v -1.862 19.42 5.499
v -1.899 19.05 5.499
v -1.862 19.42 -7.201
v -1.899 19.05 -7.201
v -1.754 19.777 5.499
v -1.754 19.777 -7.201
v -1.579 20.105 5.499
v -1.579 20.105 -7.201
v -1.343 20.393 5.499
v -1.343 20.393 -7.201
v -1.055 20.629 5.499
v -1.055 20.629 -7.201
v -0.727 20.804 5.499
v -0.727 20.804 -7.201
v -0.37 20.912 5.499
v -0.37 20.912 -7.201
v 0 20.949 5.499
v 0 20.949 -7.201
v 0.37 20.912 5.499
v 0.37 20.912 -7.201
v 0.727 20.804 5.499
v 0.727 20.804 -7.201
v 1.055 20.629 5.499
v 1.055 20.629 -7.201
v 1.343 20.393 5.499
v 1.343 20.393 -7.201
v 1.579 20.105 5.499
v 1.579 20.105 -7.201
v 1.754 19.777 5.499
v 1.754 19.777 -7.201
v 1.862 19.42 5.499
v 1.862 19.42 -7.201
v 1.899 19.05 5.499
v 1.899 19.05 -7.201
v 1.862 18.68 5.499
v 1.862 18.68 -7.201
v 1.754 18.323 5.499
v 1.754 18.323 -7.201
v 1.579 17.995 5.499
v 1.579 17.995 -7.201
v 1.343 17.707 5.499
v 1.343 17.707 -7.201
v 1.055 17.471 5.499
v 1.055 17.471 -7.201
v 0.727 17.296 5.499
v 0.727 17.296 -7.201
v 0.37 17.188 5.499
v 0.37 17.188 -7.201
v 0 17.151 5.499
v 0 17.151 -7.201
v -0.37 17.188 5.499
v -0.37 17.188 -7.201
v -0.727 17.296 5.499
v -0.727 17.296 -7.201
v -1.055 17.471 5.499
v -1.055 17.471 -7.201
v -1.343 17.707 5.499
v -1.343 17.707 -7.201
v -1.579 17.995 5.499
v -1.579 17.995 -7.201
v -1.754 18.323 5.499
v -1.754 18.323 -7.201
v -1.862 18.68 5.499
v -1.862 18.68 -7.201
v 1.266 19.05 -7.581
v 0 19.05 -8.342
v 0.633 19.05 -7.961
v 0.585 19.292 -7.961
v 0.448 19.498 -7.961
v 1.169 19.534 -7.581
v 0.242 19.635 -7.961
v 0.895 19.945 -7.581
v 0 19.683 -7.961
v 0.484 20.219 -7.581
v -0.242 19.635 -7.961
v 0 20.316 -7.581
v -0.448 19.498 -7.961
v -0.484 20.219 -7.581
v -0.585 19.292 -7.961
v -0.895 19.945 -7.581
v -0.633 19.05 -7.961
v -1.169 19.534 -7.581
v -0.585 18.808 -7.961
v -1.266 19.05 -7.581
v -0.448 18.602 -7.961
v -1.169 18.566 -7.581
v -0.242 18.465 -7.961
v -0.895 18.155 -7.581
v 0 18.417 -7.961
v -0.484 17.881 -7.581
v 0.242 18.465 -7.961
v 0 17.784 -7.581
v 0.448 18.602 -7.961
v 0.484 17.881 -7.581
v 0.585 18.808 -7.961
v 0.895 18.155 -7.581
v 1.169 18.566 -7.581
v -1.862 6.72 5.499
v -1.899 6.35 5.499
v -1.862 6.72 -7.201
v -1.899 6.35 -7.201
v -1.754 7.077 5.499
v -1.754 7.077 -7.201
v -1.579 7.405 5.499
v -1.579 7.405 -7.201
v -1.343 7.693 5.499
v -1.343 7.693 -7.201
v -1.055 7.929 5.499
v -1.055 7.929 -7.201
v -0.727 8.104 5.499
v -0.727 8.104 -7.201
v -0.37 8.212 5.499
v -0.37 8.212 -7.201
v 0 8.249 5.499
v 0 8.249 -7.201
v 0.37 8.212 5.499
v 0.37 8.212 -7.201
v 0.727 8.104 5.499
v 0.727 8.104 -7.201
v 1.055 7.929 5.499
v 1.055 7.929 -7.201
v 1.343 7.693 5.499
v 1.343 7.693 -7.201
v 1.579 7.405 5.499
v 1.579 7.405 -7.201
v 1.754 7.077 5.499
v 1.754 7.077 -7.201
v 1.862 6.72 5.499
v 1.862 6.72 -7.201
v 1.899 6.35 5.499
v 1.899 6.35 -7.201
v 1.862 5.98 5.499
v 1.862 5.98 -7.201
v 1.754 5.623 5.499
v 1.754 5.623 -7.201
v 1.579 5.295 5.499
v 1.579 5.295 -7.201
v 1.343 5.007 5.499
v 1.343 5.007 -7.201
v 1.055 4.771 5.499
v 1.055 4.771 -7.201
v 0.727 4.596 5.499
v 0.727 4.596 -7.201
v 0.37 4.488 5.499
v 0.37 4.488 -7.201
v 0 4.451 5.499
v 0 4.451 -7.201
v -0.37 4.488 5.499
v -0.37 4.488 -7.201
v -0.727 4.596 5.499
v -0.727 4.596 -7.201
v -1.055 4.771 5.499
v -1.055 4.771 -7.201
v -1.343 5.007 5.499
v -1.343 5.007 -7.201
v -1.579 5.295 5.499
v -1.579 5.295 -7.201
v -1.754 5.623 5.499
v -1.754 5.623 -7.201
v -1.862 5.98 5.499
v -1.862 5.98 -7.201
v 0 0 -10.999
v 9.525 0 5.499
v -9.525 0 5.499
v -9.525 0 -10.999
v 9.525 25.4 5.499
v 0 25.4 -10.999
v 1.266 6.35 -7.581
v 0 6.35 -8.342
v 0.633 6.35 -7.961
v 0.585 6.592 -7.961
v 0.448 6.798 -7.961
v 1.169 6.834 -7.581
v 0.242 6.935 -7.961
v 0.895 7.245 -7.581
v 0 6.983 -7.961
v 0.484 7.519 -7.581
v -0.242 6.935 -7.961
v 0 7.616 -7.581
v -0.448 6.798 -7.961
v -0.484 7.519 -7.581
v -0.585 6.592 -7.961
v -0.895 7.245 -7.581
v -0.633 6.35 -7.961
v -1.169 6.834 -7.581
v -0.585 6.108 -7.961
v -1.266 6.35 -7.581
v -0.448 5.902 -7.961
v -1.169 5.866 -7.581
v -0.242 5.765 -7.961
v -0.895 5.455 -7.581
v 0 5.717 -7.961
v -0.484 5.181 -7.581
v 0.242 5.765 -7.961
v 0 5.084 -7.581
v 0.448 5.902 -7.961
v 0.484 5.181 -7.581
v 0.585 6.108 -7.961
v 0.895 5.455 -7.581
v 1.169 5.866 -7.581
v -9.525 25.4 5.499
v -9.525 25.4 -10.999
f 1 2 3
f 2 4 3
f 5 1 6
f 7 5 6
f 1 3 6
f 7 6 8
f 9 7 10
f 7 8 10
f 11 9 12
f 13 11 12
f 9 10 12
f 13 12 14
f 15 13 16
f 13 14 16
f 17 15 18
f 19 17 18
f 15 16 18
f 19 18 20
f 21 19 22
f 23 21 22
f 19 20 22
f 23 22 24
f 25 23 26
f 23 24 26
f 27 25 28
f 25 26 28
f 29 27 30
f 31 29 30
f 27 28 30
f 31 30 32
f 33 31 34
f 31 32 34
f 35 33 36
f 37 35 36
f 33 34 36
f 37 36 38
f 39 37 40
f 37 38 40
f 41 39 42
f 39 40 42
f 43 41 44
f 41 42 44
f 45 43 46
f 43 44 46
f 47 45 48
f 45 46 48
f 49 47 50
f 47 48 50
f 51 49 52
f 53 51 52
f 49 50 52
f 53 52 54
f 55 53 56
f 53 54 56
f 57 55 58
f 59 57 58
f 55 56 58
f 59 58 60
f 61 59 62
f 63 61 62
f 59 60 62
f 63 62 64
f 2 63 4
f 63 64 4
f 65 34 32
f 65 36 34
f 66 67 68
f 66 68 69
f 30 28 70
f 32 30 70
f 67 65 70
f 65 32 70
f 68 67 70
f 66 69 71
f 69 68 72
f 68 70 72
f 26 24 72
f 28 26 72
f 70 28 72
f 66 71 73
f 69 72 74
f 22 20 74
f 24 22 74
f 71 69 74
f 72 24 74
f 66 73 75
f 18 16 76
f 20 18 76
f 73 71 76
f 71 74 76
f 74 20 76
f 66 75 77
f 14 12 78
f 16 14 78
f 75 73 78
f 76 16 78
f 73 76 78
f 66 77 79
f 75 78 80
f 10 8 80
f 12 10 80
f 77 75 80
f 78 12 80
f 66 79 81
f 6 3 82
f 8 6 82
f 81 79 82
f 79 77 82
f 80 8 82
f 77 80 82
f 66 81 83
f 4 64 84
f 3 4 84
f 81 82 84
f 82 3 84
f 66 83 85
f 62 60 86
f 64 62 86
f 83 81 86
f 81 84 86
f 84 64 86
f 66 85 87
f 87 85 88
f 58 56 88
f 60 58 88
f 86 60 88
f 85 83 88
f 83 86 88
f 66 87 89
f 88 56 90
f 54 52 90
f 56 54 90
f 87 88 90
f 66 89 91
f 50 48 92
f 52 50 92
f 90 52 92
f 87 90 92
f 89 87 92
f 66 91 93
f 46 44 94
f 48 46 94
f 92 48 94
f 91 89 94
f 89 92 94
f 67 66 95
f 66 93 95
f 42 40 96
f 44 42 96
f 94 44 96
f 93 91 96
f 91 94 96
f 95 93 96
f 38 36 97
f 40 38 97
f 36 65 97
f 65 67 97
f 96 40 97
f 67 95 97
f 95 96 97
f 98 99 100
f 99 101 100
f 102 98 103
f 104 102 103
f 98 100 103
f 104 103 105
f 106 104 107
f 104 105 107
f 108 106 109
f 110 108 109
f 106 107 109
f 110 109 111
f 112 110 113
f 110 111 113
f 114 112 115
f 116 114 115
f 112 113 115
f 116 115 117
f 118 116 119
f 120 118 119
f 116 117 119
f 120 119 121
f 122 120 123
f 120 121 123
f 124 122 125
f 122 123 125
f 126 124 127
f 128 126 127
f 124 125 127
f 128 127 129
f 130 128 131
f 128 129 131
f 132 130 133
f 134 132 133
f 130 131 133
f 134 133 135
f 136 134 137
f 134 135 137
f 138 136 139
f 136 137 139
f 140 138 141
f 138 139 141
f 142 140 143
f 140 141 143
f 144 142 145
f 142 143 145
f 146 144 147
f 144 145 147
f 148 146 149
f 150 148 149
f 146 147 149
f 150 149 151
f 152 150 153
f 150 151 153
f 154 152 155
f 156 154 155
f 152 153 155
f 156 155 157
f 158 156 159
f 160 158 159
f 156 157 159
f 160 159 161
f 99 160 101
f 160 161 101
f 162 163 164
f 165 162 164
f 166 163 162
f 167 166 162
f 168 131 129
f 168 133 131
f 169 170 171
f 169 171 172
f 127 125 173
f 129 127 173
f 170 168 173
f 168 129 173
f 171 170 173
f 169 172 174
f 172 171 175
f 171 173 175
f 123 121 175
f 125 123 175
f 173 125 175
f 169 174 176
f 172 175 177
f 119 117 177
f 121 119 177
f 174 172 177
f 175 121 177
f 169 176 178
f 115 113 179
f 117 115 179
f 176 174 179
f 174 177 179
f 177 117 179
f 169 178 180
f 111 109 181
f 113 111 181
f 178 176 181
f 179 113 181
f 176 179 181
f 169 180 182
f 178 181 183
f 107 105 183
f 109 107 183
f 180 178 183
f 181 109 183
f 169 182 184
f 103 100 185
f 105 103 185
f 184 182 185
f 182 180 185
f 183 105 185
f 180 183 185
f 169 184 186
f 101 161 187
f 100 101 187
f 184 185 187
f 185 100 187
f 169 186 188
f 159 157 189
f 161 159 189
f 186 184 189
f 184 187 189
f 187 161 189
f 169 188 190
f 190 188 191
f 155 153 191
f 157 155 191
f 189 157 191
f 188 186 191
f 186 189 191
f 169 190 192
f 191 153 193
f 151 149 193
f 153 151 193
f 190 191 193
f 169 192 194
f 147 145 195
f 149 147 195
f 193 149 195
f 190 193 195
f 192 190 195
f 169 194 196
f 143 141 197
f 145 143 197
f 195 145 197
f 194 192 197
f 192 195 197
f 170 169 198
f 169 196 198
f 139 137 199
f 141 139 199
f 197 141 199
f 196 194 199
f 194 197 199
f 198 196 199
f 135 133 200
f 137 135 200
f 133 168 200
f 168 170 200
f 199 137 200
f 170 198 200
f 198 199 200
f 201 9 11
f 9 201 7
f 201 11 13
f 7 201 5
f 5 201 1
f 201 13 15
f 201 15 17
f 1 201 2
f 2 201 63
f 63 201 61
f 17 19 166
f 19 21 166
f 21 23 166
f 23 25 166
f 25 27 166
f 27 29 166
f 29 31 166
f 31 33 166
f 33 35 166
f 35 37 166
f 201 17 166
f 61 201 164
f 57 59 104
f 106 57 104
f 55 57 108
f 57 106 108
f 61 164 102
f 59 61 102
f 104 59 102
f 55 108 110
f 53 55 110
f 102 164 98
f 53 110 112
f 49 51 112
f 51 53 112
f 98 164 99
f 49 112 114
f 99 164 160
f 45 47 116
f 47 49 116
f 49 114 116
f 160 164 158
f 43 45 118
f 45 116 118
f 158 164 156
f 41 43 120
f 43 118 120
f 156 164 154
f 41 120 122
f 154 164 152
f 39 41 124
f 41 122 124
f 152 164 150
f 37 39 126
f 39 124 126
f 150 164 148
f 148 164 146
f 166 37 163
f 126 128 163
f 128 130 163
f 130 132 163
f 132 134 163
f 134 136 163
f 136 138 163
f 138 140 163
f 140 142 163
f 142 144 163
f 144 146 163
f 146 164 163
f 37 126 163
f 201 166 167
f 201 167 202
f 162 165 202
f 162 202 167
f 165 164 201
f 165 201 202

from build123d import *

# Parameters (mm, degrees)
BOSS_EXTRUDE1_DEPTH       = 25.4
F_6_CLEARANCE_HOLE1_D     = 3.7973
F_6_CLEARANCE_HOLE1_DEPTH = 12.7
F_6_CLEARANCE_HOLE1_TIP   = 1.140824014


with BuildPart() as part:
    # Sketch1 → Boss-Extrude1 (new body)
    with BuildSketch(Plane(origin=(0, 0, 0), x_dir=(1, 0, 0), z_dir=(0, 1, 0))):
        Polygon((-9.525, 10.998522628), (0, 10.998522628), (-9.525, -5.499261314), align=None)
        Polygon((9.525, -5.499261314), (0, 10.998522628), (-9.525, -5.499261314), align=None)
    extrude(amount=BOSS_EXTRUDE1_DEPTH)

    # #6 Clearance Hole1
    with Locations(Plane(origin=(0, 19.05, 5.499261314), x_dir=(1, 0, 0), z_dir=(0, 0, 1))):
        with Locations((0, 0), (0, -12.7)):
            Hole(F_6_CLEARANCE_HOLE1_D / 2, depth=F_6_CLEARANCE_HOLE1_DEPTH)
            with Locations((0, 0, -(F_6_CLEARANCE_HOLE1_DEPTH + F_6_CLEARANCE_HOLE1_TIP / 2))):  # 118° drill point
                Cone(0, F_6_CLEARANCE_HOLE1_D / 2, F_6_CLEARANCE_HOLE1_TIP, mode=Mode.SUBTRACT)


solid = part.part
